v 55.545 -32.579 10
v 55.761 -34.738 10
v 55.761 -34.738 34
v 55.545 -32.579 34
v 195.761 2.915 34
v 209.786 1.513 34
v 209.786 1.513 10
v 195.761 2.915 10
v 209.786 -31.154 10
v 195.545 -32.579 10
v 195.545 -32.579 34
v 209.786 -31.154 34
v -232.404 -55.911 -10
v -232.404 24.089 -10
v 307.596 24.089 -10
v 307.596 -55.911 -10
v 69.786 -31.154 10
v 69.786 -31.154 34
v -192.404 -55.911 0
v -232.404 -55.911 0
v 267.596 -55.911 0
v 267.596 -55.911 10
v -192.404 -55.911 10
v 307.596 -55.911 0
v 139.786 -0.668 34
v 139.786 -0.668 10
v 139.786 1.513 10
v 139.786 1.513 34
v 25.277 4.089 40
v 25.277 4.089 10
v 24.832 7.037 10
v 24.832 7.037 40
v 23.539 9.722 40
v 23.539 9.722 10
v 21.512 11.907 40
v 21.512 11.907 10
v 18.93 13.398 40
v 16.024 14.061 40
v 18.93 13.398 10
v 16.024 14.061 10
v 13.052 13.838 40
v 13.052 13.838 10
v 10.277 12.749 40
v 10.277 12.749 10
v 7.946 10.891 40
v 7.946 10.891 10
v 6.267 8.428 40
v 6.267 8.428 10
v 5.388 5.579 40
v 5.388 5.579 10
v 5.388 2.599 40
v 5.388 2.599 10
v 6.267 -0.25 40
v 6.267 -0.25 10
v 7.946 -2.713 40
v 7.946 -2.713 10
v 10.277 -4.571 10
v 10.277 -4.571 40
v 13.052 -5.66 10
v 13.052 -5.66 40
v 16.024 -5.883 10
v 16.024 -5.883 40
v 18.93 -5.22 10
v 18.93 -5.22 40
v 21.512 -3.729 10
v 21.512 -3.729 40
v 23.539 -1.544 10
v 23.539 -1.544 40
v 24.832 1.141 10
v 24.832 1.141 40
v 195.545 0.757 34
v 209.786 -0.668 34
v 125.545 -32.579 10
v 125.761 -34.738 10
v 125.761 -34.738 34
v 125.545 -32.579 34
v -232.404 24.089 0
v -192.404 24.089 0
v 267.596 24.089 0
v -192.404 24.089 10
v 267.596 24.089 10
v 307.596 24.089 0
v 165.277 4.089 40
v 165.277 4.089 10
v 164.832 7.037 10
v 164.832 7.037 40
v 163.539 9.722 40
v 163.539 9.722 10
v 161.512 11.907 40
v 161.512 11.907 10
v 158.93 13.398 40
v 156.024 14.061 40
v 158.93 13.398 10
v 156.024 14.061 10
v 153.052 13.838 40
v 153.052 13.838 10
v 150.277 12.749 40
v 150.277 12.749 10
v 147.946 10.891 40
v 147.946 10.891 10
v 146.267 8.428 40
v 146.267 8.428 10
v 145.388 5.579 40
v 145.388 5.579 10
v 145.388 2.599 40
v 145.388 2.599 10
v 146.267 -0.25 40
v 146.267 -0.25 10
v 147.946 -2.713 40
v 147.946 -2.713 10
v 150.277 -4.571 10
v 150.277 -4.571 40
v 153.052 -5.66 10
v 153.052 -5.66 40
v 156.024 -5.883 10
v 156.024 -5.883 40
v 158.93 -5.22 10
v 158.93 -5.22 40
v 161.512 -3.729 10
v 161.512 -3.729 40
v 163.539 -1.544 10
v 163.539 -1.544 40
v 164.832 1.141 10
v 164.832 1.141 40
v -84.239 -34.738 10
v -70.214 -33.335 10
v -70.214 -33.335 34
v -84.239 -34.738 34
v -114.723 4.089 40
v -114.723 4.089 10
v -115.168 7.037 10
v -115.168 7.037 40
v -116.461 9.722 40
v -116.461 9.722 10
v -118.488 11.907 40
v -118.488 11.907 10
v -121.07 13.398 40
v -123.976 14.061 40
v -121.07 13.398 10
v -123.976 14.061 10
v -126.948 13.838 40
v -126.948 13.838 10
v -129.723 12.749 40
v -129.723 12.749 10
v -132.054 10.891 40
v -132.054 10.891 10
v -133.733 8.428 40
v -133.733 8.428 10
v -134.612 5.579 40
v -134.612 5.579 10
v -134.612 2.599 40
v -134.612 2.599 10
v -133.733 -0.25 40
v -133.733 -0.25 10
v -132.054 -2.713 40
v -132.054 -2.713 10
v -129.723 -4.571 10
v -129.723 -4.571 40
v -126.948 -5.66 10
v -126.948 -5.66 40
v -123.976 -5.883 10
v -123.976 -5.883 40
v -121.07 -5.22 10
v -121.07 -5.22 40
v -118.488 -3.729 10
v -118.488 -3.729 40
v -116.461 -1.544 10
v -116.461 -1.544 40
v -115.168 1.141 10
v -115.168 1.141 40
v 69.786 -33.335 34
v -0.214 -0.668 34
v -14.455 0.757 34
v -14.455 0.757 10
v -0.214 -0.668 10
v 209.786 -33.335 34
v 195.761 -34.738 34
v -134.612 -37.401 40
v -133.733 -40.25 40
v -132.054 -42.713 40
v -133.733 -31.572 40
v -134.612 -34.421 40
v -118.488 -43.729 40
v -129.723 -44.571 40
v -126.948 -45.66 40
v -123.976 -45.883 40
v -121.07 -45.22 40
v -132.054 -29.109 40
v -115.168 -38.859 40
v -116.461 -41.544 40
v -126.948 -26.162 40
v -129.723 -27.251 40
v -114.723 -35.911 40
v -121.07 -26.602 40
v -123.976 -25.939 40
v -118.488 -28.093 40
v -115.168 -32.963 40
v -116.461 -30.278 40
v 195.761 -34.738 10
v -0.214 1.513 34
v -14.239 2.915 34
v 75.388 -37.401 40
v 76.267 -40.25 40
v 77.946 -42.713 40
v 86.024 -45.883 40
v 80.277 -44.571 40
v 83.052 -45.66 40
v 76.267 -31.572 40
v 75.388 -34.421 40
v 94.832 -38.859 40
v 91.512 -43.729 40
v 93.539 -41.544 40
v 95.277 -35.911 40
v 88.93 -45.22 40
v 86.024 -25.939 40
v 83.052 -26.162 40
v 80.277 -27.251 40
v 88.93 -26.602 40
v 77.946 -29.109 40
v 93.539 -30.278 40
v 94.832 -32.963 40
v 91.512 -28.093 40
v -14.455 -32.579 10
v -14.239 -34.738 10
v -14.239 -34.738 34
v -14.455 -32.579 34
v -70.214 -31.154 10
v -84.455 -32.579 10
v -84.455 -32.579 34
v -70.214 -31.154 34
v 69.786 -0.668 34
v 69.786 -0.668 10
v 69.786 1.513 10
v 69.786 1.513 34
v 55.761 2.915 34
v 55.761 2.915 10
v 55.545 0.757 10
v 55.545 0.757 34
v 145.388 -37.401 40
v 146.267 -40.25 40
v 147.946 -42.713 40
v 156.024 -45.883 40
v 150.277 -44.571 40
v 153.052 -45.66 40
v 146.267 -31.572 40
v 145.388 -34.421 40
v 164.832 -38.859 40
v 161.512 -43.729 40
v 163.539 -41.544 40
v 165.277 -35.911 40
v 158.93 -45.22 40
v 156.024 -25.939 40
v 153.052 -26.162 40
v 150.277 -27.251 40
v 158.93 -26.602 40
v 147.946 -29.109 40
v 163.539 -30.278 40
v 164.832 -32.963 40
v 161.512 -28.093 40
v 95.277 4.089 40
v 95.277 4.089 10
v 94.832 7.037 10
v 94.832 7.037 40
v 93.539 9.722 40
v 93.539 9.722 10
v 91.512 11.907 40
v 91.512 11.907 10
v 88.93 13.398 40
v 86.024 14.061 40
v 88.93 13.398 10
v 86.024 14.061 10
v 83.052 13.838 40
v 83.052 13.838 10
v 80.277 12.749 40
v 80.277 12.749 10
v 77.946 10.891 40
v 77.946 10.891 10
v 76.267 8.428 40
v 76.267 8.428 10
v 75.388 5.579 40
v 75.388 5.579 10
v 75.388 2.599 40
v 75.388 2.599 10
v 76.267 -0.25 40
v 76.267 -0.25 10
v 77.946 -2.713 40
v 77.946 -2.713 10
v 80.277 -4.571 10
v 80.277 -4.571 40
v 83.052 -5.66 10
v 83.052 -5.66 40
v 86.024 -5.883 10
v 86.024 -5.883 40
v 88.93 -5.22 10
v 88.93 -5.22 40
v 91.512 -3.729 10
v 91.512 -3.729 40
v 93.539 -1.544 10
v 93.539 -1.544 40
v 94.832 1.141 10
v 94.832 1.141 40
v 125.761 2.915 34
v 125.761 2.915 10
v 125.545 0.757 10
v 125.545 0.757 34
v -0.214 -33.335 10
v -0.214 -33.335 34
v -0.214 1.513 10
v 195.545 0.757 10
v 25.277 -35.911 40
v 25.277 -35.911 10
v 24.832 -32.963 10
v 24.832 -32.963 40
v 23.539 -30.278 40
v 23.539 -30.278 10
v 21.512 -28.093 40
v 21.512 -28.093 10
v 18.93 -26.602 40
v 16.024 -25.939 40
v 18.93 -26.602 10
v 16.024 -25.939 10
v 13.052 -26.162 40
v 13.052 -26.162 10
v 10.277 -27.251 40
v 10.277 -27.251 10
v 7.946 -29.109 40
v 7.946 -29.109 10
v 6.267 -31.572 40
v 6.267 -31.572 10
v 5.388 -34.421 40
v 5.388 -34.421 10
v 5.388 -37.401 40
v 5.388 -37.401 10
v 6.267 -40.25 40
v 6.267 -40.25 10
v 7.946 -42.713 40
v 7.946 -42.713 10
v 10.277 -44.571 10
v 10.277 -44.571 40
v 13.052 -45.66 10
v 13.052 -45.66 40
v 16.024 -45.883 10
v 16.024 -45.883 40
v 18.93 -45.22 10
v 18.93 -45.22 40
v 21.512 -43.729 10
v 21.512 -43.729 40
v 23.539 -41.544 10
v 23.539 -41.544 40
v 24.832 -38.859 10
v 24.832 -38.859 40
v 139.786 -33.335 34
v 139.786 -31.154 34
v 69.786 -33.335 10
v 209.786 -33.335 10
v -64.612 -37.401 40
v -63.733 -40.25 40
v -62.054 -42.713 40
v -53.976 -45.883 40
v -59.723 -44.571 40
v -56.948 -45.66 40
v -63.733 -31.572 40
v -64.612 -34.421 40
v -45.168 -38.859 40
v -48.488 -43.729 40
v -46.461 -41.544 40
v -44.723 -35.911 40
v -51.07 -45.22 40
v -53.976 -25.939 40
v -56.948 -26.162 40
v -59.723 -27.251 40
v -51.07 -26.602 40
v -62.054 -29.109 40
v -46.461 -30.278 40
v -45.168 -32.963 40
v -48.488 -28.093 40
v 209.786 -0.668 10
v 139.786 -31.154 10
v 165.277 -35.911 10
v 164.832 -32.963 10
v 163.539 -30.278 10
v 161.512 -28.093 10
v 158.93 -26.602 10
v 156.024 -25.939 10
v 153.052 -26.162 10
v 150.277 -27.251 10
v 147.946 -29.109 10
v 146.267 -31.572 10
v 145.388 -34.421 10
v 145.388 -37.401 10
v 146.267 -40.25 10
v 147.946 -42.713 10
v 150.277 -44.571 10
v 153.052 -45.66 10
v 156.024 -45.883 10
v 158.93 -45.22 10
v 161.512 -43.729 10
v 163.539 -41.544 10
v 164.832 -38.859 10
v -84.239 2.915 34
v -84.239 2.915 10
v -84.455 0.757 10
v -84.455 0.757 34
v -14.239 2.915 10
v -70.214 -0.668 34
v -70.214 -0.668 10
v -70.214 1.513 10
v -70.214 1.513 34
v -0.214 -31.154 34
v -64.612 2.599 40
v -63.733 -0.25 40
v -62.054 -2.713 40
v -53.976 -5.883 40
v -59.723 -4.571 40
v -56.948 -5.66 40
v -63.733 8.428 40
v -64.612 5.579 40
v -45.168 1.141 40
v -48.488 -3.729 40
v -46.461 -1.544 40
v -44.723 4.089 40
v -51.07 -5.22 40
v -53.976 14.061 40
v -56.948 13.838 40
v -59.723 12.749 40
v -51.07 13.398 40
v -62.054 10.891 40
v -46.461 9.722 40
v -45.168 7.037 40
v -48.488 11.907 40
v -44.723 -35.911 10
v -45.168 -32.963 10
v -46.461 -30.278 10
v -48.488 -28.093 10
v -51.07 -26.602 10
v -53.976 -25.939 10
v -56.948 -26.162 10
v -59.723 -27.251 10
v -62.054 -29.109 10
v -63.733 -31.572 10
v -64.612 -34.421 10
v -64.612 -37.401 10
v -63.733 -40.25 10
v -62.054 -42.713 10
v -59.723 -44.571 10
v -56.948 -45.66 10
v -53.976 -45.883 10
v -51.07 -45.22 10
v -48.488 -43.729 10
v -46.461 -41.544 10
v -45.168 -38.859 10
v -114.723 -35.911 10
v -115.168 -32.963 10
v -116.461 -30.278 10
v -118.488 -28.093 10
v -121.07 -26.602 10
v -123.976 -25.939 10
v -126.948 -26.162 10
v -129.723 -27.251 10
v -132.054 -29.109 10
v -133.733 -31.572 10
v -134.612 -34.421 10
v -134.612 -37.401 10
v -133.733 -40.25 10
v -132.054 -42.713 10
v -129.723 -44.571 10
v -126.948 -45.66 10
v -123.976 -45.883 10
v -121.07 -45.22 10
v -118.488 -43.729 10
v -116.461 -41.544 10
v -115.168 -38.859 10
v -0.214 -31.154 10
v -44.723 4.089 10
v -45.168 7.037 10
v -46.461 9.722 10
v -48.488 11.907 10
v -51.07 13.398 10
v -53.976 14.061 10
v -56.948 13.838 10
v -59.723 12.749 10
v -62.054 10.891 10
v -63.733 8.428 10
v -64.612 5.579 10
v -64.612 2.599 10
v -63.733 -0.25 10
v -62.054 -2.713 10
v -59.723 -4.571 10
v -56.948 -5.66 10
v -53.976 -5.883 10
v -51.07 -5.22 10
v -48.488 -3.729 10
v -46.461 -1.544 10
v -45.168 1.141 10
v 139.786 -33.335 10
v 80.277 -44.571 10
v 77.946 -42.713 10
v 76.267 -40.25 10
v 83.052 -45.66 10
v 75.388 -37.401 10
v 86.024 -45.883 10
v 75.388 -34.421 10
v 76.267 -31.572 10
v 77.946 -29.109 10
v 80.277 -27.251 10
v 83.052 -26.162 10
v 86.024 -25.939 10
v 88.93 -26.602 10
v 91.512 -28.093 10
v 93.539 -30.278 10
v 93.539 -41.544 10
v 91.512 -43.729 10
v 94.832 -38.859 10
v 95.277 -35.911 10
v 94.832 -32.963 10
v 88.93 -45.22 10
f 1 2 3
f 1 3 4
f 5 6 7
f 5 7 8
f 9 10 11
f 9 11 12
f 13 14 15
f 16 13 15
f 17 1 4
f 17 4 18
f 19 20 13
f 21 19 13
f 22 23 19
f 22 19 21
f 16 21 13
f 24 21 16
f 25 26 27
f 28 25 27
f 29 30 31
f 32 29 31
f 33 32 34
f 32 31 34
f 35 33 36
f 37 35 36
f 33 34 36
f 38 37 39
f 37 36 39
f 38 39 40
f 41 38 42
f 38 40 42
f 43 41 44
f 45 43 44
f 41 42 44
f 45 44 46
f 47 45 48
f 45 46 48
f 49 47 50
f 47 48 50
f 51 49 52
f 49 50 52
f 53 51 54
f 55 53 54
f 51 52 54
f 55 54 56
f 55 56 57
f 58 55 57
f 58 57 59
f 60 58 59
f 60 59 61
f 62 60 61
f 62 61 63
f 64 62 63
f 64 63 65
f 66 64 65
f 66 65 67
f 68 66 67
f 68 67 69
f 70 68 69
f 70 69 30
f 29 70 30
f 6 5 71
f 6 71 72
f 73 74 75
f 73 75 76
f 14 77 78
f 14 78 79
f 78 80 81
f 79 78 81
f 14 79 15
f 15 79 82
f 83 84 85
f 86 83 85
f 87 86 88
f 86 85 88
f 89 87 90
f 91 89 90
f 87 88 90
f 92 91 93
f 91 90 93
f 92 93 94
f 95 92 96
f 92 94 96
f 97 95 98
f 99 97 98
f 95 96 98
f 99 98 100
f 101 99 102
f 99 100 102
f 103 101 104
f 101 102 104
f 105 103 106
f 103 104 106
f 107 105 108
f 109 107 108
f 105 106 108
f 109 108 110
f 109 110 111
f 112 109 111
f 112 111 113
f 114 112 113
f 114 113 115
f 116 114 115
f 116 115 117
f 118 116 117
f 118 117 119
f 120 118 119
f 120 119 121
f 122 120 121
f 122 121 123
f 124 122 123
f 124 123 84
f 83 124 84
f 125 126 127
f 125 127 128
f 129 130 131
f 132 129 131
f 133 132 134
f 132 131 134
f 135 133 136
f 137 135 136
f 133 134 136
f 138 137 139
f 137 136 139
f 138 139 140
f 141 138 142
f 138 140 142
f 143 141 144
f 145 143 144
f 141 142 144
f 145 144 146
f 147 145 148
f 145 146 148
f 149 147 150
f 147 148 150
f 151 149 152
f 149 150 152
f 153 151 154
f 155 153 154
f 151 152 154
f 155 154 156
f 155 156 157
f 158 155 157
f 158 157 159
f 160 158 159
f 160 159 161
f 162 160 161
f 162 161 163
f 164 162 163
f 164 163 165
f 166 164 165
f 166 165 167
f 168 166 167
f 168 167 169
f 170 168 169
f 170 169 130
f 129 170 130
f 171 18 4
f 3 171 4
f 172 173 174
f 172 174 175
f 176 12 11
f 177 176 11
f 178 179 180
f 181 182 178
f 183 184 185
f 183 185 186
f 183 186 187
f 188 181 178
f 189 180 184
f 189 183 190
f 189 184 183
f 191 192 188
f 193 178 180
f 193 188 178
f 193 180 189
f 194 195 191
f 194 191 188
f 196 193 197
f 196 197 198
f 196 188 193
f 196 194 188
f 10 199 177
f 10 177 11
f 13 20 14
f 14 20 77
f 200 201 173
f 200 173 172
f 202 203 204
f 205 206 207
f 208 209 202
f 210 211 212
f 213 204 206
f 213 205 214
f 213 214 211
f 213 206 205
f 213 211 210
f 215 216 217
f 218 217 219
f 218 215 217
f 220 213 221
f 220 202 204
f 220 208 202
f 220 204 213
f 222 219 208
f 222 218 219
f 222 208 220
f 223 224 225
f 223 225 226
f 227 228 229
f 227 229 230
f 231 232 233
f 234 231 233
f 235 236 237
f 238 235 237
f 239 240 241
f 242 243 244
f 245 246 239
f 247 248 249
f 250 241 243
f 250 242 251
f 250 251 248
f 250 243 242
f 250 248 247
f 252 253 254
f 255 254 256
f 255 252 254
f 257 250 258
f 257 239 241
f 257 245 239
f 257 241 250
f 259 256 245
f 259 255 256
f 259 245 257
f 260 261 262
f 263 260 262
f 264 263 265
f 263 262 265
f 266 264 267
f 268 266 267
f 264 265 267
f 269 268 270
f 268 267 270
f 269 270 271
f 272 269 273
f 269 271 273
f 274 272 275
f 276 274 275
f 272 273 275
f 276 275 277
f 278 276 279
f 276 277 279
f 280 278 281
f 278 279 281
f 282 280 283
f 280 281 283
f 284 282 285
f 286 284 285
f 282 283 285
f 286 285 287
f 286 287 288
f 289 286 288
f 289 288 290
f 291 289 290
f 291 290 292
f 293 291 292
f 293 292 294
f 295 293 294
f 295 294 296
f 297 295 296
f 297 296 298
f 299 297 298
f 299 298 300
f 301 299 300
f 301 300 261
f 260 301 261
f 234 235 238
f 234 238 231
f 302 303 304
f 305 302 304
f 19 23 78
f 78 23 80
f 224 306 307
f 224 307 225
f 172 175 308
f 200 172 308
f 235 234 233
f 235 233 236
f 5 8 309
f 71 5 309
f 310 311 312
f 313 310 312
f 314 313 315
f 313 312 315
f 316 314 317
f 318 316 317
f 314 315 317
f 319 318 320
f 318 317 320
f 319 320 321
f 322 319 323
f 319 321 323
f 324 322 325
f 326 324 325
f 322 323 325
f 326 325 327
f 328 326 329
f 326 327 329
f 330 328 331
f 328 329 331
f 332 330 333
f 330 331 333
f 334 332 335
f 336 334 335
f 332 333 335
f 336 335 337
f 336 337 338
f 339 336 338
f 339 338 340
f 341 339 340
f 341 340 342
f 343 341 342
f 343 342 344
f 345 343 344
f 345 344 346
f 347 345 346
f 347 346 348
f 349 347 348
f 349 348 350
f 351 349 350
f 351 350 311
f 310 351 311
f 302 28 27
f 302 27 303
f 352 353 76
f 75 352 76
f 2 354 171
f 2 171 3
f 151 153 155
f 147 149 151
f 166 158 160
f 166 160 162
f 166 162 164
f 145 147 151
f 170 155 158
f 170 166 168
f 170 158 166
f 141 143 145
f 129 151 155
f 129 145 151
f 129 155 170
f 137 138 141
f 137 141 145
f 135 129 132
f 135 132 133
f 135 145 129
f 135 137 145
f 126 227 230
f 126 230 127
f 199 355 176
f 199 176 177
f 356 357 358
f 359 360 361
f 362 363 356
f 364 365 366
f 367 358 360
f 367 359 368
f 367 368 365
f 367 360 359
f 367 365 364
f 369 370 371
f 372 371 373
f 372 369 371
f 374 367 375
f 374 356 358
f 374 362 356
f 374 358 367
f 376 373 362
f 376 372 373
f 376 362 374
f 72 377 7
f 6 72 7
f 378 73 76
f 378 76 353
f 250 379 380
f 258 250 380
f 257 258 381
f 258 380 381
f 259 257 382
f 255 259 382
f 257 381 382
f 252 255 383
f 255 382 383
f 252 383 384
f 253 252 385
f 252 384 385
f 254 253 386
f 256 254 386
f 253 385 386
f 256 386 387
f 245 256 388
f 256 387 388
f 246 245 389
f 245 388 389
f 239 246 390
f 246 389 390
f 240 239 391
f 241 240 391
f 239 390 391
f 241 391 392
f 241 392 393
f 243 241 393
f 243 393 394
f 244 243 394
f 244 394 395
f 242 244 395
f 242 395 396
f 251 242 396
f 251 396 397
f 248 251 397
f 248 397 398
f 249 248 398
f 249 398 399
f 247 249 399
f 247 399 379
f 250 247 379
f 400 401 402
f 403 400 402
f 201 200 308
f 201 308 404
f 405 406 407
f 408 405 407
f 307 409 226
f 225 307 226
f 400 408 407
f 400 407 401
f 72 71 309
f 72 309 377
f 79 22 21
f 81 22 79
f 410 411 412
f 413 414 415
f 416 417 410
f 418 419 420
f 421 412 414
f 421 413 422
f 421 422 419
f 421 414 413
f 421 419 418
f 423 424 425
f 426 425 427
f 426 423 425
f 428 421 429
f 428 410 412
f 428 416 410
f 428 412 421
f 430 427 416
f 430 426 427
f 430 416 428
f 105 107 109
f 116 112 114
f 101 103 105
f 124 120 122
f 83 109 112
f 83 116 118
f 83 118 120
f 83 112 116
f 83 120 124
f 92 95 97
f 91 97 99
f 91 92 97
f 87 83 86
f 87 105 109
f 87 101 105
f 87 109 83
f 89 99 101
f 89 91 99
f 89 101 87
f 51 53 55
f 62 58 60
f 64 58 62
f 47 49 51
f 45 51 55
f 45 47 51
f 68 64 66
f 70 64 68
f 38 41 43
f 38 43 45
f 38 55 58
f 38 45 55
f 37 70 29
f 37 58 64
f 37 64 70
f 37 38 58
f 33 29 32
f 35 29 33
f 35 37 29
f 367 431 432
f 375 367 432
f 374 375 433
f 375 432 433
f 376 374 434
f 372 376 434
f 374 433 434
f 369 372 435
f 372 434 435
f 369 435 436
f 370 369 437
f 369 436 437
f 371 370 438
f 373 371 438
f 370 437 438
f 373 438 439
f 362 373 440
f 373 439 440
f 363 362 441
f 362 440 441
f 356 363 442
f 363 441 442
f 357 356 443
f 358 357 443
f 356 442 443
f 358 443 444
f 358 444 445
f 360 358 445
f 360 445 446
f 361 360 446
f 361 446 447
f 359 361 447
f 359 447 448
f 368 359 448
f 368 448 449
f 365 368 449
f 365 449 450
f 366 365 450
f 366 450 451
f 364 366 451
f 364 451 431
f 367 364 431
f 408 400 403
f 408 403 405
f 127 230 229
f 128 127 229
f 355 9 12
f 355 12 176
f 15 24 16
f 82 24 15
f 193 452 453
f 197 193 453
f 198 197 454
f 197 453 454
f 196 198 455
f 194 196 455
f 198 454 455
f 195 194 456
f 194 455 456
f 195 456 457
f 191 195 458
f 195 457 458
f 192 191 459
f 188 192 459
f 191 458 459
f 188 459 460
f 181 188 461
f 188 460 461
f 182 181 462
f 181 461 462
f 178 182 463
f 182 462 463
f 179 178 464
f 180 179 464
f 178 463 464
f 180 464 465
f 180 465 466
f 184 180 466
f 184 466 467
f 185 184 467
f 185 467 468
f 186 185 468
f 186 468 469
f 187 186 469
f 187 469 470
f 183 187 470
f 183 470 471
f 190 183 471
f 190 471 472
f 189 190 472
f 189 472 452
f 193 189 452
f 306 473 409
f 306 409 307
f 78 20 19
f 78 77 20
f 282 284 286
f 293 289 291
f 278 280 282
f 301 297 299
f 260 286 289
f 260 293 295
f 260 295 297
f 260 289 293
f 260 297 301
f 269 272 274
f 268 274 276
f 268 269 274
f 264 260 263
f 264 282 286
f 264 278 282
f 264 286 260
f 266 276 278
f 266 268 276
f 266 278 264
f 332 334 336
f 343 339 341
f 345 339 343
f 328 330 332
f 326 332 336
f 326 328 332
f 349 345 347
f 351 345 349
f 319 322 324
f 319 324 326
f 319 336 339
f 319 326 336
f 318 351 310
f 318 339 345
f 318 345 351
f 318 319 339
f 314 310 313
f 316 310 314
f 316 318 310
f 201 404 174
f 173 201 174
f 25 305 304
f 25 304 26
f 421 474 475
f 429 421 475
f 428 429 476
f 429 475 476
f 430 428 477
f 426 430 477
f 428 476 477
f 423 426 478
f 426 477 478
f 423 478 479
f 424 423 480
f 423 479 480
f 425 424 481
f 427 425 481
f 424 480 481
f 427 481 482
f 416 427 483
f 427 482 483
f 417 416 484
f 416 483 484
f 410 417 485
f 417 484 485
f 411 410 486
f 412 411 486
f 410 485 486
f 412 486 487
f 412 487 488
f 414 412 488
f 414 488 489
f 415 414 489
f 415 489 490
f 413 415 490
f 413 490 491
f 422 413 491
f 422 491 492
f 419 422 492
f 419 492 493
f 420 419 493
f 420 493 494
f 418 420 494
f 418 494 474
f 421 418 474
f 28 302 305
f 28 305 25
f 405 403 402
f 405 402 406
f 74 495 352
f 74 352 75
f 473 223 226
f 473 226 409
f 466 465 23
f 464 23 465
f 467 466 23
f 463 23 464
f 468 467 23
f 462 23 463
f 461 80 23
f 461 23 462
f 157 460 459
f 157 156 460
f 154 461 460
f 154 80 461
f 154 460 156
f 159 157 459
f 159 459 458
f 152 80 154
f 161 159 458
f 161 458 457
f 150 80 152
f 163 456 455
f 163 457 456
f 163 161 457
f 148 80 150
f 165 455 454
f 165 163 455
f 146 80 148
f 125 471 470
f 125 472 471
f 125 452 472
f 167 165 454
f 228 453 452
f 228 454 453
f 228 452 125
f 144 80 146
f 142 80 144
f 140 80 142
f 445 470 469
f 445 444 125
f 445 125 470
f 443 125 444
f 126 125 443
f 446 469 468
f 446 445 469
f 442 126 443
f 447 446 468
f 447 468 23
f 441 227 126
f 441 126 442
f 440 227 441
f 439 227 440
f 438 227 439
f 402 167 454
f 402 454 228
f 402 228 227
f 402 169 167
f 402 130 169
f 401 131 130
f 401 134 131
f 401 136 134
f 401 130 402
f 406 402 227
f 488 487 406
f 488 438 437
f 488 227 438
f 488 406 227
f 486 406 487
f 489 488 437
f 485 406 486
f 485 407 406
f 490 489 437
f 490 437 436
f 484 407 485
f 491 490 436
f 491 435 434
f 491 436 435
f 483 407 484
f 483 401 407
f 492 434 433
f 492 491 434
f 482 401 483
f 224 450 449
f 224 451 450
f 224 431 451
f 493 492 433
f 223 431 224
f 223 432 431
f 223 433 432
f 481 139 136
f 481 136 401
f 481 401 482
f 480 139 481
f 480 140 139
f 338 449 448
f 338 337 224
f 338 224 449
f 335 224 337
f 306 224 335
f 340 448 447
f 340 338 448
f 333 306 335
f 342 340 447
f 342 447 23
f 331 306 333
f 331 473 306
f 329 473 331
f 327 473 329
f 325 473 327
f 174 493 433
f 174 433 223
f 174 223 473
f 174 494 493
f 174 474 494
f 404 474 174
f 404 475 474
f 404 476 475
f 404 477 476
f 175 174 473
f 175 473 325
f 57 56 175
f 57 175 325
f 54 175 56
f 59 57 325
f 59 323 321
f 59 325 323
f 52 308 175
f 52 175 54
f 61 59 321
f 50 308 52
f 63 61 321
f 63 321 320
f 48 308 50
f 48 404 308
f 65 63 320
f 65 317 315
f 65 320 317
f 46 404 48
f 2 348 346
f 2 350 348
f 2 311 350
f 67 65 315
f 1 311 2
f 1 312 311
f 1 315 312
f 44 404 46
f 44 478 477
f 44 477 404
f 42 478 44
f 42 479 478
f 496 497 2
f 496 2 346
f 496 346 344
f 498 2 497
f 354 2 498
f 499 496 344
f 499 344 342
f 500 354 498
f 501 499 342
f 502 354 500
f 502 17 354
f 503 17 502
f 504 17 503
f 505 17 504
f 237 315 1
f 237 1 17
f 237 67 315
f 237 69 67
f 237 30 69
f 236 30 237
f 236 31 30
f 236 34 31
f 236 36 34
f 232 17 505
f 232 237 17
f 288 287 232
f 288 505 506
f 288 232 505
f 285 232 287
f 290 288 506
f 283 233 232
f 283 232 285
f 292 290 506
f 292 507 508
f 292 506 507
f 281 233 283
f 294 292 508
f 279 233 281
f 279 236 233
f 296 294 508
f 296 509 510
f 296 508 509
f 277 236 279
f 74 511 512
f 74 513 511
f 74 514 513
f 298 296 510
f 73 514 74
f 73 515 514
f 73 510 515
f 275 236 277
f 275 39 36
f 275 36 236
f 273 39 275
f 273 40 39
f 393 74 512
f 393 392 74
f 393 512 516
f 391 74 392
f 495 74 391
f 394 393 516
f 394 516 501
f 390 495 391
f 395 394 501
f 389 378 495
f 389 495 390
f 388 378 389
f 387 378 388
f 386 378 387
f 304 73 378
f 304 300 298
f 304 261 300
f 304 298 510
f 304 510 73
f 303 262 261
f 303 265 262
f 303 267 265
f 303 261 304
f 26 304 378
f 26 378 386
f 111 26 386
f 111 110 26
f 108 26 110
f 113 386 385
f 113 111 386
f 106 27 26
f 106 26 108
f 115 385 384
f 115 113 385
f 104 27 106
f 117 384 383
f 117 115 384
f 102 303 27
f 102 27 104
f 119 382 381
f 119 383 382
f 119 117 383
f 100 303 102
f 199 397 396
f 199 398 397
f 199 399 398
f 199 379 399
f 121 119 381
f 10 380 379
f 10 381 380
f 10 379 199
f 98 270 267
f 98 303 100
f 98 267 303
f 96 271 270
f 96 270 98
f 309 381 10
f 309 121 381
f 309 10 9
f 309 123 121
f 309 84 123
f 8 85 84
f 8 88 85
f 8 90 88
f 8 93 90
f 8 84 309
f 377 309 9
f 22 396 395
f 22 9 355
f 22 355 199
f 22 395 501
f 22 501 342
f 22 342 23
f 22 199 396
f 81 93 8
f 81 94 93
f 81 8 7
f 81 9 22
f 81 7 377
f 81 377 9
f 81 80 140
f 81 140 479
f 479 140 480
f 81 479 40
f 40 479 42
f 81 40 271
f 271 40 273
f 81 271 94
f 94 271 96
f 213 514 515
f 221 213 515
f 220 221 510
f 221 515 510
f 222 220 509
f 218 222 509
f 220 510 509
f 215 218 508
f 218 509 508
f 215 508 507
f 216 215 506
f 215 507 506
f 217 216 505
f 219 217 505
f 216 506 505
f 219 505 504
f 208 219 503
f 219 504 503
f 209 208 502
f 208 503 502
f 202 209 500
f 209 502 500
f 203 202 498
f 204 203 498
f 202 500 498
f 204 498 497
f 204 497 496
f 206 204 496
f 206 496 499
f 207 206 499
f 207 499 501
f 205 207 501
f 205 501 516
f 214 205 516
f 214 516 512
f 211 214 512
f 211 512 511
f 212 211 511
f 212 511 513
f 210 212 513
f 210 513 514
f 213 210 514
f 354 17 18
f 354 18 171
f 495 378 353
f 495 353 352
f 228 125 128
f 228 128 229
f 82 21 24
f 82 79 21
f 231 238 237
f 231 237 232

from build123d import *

# Parameters (mm, degrees)
SKETCH_1_W             = 40
SKETCH_1_H             = 80
SKETCH_1_W_2           = 460
SKETCH_1_R             = 10
EXTRUDE_1_DEPTH        = 10
EXTRUDE_START          = 10
SKETCH_1_3_W           = 460
SKETCH_1_3_H           = 80
SKETCH_1_3_R           = 10
EXTRUDE_2_DEPTH        = 10
EXTRUDE_START_2        = -10
SKETCH_1_4_R           = 10
EXTRUDE_3_DEPTH        = 50
EXTRUDE_4_DEPTH        = 24
PATTERN_LINEAR_2_COUNT = 5
PATTERN_LINEAR_2_PITCH = 70


with BuildPart() as part:
    # 草图1 → 凸台-拉伸1 (new body)
    # profile 1 of 3: a face of its own
    with BuildSketch(Plane.XY):
        with Locations((-212.403603398, -15.911028094)):
            Rectangle(SKETCH_1_W, SKETCH_1_H)
    # profile 2 of 3: a face of its own
    with BuildSketch(Plane.XY):
        with Locations((37.596396602, -15.911028094)):
            Rectangle(SKETCH_1_W_2, SKETCH_1_H)
        with Locations((-124.723239389, -35.911028094)):
            Circle(SKETCH_1_R, mode=Mode.SUBTRACT)
        with Locations((-54.723239389, -35.911028094)):
            Circle(SKETCH_1_R, mode=Mode.SUBTRACT)
        with Locations((15.276760611, -35.911028094)):
            Circle(SKETCH_1_R, mode=Mode.SUBTRACT)
        with Locations((85.276760611, -35.911028094)):
            Circle(SKETCH_1_R, mode=Mode.SUBTRACT)
        with Locations((155.276760611, -35.911028094)):
            Circle(SKETCH_1_R, mode=Mode.SUBTRACT)
        with Locations((-124.723239389, 4.088971906)):
            Circle(SKETCH_1_R, mode=Mode.SUBTRACT)
        with Locations((-54.723239389, 4.088971906)):
            Circle(SKETCH_1_R, mode=Mode.SUBTRACT)
        with Locations((15.276760611, 4.088971906)):
            Circle(SKETCH_1_R, mode=Mode.SUBTRACT)
        with Locations((85.276760611, 4.088971906)):
            Circle(SKETCH_1_R, mode=Mode.SUBTRACT)
        with Locations((155.276760611, 4.088971906)):
            Circle(SKETCH_1_R, mode=Mode.SUBTRACT)
    # profile 3 of 3: a face of its own
    with BuildSketch(Plane.XY):
        with Locations((287.596396602, -15.911028094)):
            Rectangle(SKETCH_1_W, SKETCH_1_H)
    extrude(amount=-EXTRUDE_1_DEPTH)

    # 草图1<3> → 凸台-拉伸2 (add)
    with BuildSketch(Plane.XY.offset(EXTRUDE_START)):
        with Locations((37.596396602, -15.911028094)):
            Rectangle(SKETCH_1_3_W, SKETCH_1_3_H)
        with Locations((-124.723239389, -35.911028094)):
            Circle(SKETCH_1_3_R, mode=Mode.SUBTRACT)
        with Locations((-54.723239389, -35.911028094)):
            Circle(SKETCH_1_3_R, mode=Mode.SUBTRACT)
        with Locations((15.276760611, -35.911028094)):
            Circle(SKETCH_1_3_R, mode=Mode.SUBTRACT)
        with Locations((85.276760611, -35.911028094)):
            Circle(SKETCH_1_3_R, mode=Mode.SUBTRACT)
        with Locations((155.276760611, -35.911028094)):
            Circle(SKETCH_1_3_R, mode=Mode.SUBTRACT)
        with Locations((-124.723239389, 4.088971906)):
            Circle(SKETCH_1_3_R, mode=Mode.SUBTRACT)
        with Locations((-54.723239389, 4.088971906)):
            Circle(SKETCH_1_3_R, mode=Mode.SUBTRACT)
        with Locations((15.276760611, 4.088971906)):
            Circle(SKETCH_1_3_R, mode=Mode.SUBTRACT)
        with Locations((85.276760611, 4.088971906)):
            Circle(SKETCH_1_3_R, mode=Mode.SUBTRACT)
        with Locations((155.276760611, 4.088971906)):
            Circle(SKETCH_1_3_R, mode=Mode.SUBTRACT)
    extrude(amount=-EXTRUDE_2_DEPTH)

    # 草图1<4> → 凸台-拉伸3 (add)
    with BuildSketch(Plane.XY.offset(EXTRUDE_START_2)):
        with Locations((-124.723239389, -35.911028094)):
            Circle(SKETCH_1_4_R)
        with Locations((-124.723239389, 4.088971906)):
            Circle(SKETCH_1_4_R)
        with Locations((-54.723239389, -35.911028094)):
            Circle(SKETCH_1_4_R)
        with Locations((15.276760611, -35.911028094)):
            Circle(SKETCH_1_4_R)
        with Locations((85.276760611, 4.088971906)):
            Circle(SKETCH_1_4_R)
        with Locations((155.276760611, 4.088971906)):
            Circle(SKETCH_1_4_R)
        with Locations((-54.723239389, 4.088971906)):
            Circle(SKETCH_1_4_R)
        with Locations((15.276760611, 4.088971906)):
            Circle(SKETCH_1_4_R)
        with Locations((85.276760611, -35.911028094)):
            Circle(SKETCH_1_4_R)
        with Locations((155.276760611, -35.911028094)):
            Circle(SKETCH_1_4_R)
    extrude(amount=EXTRUDE_3_DEPTH)

    # 草图2 → 凸台-拉伸4 (add)
    with BuildSketch(Plane.XY.offset(10)):
        Polygon((-70.214292819, 1.512613092), (-84.238622357, 2.9154911), (-84.454570484, 0.756694909), (-70.214292819, -0.667784764), align=None)
        Polygon((-70.214292819, -31.154271424), (-70.214292819, -33.334669281), (-84.238622357, -34.737547289), (-84.454570484, -32.578751098), align=None)
    extrude_4 = extrude(amount=EXTRUDE_4_DEPTH)

    # 阵列(线性)2: 凸台-拉伸4 ×5
    with Locations(*[(i * PATTERN_LINEAR_2_PITCH, 0, 0) for i in range(1, PATTERN_LINEAR_2_COUNT)]):
        add(extrude_4)


solid = part.part
